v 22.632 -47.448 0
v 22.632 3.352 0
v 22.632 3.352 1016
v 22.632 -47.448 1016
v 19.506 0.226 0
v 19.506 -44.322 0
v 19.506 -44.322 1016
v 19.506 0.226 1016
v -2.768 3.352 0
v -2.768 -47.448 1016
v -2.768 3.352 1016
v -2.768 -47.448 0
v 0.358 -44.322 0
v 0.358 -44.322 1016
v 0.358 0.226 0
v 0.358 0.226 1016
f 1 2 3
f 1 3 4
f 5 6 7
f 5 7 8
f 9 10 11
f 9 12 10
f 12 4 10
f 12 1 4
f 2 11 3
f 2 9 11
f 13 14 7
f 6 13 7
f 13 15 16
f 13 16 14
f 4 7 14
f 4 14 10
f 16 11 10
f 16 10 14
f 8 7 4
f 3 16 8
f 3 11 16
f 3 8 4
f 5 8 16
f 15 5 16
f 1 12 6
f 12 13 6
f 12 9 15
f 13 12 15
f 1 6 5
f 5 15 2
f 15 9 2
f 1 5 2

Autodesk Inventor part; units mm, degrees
ref_plane "YZ Plane" through (0, 0, 0) normal (1, 0, 0) x (0, 1, 0)
ref_plane "XZ Plane" through (0, 0, 0) normal (0, 1, 0) x (-1, 0, 0)
ref_plane "XY Plane" through (0, 0, 0) normal (0, 0, 1) x (1, 0, 0)
sketch "Sketch1" plane through (0, 0, 0) normal (0, 0, 1) x (1, 0, 0)
  line L0 (-2.7678, 3.3517) -> (22.6322, 3.3517)
  line L1 (22.6322, 3.3517) -> (22.6322, -47.4483)
  line L2 (22.6322, -47.4483) -> (-2.7678, -47.4483)
  line L3 (-2.7678, -47.4483) -> (-2.7678, 3.3517)
  line L4 (19.5061, 0.2256) -> (0.3583, 0.2256)
  line L5 (0.3583, 0.2256) -> (0.3583, -44.3222)
  line L6 (0.3583, -44.3222) -> (19.5061, -44.3222)
  line L7 (19.5061, -44.3222) -> (19.5061, 0.2256)
  point P0 (0, 0)
  dimension "d0" = 25.4
  dimension "d1" = 50.8
extrude "Extrusion1" add sketch "Sketch1" along normal blind 1016
sketch "Sketch2" plane through (-2.7678, 3.3517, 0) normal (0, 1, 0) x (1, 0, 0)
  point P0 (2.7678, 0)
properties part number "40in 2x1 boxbeam"
